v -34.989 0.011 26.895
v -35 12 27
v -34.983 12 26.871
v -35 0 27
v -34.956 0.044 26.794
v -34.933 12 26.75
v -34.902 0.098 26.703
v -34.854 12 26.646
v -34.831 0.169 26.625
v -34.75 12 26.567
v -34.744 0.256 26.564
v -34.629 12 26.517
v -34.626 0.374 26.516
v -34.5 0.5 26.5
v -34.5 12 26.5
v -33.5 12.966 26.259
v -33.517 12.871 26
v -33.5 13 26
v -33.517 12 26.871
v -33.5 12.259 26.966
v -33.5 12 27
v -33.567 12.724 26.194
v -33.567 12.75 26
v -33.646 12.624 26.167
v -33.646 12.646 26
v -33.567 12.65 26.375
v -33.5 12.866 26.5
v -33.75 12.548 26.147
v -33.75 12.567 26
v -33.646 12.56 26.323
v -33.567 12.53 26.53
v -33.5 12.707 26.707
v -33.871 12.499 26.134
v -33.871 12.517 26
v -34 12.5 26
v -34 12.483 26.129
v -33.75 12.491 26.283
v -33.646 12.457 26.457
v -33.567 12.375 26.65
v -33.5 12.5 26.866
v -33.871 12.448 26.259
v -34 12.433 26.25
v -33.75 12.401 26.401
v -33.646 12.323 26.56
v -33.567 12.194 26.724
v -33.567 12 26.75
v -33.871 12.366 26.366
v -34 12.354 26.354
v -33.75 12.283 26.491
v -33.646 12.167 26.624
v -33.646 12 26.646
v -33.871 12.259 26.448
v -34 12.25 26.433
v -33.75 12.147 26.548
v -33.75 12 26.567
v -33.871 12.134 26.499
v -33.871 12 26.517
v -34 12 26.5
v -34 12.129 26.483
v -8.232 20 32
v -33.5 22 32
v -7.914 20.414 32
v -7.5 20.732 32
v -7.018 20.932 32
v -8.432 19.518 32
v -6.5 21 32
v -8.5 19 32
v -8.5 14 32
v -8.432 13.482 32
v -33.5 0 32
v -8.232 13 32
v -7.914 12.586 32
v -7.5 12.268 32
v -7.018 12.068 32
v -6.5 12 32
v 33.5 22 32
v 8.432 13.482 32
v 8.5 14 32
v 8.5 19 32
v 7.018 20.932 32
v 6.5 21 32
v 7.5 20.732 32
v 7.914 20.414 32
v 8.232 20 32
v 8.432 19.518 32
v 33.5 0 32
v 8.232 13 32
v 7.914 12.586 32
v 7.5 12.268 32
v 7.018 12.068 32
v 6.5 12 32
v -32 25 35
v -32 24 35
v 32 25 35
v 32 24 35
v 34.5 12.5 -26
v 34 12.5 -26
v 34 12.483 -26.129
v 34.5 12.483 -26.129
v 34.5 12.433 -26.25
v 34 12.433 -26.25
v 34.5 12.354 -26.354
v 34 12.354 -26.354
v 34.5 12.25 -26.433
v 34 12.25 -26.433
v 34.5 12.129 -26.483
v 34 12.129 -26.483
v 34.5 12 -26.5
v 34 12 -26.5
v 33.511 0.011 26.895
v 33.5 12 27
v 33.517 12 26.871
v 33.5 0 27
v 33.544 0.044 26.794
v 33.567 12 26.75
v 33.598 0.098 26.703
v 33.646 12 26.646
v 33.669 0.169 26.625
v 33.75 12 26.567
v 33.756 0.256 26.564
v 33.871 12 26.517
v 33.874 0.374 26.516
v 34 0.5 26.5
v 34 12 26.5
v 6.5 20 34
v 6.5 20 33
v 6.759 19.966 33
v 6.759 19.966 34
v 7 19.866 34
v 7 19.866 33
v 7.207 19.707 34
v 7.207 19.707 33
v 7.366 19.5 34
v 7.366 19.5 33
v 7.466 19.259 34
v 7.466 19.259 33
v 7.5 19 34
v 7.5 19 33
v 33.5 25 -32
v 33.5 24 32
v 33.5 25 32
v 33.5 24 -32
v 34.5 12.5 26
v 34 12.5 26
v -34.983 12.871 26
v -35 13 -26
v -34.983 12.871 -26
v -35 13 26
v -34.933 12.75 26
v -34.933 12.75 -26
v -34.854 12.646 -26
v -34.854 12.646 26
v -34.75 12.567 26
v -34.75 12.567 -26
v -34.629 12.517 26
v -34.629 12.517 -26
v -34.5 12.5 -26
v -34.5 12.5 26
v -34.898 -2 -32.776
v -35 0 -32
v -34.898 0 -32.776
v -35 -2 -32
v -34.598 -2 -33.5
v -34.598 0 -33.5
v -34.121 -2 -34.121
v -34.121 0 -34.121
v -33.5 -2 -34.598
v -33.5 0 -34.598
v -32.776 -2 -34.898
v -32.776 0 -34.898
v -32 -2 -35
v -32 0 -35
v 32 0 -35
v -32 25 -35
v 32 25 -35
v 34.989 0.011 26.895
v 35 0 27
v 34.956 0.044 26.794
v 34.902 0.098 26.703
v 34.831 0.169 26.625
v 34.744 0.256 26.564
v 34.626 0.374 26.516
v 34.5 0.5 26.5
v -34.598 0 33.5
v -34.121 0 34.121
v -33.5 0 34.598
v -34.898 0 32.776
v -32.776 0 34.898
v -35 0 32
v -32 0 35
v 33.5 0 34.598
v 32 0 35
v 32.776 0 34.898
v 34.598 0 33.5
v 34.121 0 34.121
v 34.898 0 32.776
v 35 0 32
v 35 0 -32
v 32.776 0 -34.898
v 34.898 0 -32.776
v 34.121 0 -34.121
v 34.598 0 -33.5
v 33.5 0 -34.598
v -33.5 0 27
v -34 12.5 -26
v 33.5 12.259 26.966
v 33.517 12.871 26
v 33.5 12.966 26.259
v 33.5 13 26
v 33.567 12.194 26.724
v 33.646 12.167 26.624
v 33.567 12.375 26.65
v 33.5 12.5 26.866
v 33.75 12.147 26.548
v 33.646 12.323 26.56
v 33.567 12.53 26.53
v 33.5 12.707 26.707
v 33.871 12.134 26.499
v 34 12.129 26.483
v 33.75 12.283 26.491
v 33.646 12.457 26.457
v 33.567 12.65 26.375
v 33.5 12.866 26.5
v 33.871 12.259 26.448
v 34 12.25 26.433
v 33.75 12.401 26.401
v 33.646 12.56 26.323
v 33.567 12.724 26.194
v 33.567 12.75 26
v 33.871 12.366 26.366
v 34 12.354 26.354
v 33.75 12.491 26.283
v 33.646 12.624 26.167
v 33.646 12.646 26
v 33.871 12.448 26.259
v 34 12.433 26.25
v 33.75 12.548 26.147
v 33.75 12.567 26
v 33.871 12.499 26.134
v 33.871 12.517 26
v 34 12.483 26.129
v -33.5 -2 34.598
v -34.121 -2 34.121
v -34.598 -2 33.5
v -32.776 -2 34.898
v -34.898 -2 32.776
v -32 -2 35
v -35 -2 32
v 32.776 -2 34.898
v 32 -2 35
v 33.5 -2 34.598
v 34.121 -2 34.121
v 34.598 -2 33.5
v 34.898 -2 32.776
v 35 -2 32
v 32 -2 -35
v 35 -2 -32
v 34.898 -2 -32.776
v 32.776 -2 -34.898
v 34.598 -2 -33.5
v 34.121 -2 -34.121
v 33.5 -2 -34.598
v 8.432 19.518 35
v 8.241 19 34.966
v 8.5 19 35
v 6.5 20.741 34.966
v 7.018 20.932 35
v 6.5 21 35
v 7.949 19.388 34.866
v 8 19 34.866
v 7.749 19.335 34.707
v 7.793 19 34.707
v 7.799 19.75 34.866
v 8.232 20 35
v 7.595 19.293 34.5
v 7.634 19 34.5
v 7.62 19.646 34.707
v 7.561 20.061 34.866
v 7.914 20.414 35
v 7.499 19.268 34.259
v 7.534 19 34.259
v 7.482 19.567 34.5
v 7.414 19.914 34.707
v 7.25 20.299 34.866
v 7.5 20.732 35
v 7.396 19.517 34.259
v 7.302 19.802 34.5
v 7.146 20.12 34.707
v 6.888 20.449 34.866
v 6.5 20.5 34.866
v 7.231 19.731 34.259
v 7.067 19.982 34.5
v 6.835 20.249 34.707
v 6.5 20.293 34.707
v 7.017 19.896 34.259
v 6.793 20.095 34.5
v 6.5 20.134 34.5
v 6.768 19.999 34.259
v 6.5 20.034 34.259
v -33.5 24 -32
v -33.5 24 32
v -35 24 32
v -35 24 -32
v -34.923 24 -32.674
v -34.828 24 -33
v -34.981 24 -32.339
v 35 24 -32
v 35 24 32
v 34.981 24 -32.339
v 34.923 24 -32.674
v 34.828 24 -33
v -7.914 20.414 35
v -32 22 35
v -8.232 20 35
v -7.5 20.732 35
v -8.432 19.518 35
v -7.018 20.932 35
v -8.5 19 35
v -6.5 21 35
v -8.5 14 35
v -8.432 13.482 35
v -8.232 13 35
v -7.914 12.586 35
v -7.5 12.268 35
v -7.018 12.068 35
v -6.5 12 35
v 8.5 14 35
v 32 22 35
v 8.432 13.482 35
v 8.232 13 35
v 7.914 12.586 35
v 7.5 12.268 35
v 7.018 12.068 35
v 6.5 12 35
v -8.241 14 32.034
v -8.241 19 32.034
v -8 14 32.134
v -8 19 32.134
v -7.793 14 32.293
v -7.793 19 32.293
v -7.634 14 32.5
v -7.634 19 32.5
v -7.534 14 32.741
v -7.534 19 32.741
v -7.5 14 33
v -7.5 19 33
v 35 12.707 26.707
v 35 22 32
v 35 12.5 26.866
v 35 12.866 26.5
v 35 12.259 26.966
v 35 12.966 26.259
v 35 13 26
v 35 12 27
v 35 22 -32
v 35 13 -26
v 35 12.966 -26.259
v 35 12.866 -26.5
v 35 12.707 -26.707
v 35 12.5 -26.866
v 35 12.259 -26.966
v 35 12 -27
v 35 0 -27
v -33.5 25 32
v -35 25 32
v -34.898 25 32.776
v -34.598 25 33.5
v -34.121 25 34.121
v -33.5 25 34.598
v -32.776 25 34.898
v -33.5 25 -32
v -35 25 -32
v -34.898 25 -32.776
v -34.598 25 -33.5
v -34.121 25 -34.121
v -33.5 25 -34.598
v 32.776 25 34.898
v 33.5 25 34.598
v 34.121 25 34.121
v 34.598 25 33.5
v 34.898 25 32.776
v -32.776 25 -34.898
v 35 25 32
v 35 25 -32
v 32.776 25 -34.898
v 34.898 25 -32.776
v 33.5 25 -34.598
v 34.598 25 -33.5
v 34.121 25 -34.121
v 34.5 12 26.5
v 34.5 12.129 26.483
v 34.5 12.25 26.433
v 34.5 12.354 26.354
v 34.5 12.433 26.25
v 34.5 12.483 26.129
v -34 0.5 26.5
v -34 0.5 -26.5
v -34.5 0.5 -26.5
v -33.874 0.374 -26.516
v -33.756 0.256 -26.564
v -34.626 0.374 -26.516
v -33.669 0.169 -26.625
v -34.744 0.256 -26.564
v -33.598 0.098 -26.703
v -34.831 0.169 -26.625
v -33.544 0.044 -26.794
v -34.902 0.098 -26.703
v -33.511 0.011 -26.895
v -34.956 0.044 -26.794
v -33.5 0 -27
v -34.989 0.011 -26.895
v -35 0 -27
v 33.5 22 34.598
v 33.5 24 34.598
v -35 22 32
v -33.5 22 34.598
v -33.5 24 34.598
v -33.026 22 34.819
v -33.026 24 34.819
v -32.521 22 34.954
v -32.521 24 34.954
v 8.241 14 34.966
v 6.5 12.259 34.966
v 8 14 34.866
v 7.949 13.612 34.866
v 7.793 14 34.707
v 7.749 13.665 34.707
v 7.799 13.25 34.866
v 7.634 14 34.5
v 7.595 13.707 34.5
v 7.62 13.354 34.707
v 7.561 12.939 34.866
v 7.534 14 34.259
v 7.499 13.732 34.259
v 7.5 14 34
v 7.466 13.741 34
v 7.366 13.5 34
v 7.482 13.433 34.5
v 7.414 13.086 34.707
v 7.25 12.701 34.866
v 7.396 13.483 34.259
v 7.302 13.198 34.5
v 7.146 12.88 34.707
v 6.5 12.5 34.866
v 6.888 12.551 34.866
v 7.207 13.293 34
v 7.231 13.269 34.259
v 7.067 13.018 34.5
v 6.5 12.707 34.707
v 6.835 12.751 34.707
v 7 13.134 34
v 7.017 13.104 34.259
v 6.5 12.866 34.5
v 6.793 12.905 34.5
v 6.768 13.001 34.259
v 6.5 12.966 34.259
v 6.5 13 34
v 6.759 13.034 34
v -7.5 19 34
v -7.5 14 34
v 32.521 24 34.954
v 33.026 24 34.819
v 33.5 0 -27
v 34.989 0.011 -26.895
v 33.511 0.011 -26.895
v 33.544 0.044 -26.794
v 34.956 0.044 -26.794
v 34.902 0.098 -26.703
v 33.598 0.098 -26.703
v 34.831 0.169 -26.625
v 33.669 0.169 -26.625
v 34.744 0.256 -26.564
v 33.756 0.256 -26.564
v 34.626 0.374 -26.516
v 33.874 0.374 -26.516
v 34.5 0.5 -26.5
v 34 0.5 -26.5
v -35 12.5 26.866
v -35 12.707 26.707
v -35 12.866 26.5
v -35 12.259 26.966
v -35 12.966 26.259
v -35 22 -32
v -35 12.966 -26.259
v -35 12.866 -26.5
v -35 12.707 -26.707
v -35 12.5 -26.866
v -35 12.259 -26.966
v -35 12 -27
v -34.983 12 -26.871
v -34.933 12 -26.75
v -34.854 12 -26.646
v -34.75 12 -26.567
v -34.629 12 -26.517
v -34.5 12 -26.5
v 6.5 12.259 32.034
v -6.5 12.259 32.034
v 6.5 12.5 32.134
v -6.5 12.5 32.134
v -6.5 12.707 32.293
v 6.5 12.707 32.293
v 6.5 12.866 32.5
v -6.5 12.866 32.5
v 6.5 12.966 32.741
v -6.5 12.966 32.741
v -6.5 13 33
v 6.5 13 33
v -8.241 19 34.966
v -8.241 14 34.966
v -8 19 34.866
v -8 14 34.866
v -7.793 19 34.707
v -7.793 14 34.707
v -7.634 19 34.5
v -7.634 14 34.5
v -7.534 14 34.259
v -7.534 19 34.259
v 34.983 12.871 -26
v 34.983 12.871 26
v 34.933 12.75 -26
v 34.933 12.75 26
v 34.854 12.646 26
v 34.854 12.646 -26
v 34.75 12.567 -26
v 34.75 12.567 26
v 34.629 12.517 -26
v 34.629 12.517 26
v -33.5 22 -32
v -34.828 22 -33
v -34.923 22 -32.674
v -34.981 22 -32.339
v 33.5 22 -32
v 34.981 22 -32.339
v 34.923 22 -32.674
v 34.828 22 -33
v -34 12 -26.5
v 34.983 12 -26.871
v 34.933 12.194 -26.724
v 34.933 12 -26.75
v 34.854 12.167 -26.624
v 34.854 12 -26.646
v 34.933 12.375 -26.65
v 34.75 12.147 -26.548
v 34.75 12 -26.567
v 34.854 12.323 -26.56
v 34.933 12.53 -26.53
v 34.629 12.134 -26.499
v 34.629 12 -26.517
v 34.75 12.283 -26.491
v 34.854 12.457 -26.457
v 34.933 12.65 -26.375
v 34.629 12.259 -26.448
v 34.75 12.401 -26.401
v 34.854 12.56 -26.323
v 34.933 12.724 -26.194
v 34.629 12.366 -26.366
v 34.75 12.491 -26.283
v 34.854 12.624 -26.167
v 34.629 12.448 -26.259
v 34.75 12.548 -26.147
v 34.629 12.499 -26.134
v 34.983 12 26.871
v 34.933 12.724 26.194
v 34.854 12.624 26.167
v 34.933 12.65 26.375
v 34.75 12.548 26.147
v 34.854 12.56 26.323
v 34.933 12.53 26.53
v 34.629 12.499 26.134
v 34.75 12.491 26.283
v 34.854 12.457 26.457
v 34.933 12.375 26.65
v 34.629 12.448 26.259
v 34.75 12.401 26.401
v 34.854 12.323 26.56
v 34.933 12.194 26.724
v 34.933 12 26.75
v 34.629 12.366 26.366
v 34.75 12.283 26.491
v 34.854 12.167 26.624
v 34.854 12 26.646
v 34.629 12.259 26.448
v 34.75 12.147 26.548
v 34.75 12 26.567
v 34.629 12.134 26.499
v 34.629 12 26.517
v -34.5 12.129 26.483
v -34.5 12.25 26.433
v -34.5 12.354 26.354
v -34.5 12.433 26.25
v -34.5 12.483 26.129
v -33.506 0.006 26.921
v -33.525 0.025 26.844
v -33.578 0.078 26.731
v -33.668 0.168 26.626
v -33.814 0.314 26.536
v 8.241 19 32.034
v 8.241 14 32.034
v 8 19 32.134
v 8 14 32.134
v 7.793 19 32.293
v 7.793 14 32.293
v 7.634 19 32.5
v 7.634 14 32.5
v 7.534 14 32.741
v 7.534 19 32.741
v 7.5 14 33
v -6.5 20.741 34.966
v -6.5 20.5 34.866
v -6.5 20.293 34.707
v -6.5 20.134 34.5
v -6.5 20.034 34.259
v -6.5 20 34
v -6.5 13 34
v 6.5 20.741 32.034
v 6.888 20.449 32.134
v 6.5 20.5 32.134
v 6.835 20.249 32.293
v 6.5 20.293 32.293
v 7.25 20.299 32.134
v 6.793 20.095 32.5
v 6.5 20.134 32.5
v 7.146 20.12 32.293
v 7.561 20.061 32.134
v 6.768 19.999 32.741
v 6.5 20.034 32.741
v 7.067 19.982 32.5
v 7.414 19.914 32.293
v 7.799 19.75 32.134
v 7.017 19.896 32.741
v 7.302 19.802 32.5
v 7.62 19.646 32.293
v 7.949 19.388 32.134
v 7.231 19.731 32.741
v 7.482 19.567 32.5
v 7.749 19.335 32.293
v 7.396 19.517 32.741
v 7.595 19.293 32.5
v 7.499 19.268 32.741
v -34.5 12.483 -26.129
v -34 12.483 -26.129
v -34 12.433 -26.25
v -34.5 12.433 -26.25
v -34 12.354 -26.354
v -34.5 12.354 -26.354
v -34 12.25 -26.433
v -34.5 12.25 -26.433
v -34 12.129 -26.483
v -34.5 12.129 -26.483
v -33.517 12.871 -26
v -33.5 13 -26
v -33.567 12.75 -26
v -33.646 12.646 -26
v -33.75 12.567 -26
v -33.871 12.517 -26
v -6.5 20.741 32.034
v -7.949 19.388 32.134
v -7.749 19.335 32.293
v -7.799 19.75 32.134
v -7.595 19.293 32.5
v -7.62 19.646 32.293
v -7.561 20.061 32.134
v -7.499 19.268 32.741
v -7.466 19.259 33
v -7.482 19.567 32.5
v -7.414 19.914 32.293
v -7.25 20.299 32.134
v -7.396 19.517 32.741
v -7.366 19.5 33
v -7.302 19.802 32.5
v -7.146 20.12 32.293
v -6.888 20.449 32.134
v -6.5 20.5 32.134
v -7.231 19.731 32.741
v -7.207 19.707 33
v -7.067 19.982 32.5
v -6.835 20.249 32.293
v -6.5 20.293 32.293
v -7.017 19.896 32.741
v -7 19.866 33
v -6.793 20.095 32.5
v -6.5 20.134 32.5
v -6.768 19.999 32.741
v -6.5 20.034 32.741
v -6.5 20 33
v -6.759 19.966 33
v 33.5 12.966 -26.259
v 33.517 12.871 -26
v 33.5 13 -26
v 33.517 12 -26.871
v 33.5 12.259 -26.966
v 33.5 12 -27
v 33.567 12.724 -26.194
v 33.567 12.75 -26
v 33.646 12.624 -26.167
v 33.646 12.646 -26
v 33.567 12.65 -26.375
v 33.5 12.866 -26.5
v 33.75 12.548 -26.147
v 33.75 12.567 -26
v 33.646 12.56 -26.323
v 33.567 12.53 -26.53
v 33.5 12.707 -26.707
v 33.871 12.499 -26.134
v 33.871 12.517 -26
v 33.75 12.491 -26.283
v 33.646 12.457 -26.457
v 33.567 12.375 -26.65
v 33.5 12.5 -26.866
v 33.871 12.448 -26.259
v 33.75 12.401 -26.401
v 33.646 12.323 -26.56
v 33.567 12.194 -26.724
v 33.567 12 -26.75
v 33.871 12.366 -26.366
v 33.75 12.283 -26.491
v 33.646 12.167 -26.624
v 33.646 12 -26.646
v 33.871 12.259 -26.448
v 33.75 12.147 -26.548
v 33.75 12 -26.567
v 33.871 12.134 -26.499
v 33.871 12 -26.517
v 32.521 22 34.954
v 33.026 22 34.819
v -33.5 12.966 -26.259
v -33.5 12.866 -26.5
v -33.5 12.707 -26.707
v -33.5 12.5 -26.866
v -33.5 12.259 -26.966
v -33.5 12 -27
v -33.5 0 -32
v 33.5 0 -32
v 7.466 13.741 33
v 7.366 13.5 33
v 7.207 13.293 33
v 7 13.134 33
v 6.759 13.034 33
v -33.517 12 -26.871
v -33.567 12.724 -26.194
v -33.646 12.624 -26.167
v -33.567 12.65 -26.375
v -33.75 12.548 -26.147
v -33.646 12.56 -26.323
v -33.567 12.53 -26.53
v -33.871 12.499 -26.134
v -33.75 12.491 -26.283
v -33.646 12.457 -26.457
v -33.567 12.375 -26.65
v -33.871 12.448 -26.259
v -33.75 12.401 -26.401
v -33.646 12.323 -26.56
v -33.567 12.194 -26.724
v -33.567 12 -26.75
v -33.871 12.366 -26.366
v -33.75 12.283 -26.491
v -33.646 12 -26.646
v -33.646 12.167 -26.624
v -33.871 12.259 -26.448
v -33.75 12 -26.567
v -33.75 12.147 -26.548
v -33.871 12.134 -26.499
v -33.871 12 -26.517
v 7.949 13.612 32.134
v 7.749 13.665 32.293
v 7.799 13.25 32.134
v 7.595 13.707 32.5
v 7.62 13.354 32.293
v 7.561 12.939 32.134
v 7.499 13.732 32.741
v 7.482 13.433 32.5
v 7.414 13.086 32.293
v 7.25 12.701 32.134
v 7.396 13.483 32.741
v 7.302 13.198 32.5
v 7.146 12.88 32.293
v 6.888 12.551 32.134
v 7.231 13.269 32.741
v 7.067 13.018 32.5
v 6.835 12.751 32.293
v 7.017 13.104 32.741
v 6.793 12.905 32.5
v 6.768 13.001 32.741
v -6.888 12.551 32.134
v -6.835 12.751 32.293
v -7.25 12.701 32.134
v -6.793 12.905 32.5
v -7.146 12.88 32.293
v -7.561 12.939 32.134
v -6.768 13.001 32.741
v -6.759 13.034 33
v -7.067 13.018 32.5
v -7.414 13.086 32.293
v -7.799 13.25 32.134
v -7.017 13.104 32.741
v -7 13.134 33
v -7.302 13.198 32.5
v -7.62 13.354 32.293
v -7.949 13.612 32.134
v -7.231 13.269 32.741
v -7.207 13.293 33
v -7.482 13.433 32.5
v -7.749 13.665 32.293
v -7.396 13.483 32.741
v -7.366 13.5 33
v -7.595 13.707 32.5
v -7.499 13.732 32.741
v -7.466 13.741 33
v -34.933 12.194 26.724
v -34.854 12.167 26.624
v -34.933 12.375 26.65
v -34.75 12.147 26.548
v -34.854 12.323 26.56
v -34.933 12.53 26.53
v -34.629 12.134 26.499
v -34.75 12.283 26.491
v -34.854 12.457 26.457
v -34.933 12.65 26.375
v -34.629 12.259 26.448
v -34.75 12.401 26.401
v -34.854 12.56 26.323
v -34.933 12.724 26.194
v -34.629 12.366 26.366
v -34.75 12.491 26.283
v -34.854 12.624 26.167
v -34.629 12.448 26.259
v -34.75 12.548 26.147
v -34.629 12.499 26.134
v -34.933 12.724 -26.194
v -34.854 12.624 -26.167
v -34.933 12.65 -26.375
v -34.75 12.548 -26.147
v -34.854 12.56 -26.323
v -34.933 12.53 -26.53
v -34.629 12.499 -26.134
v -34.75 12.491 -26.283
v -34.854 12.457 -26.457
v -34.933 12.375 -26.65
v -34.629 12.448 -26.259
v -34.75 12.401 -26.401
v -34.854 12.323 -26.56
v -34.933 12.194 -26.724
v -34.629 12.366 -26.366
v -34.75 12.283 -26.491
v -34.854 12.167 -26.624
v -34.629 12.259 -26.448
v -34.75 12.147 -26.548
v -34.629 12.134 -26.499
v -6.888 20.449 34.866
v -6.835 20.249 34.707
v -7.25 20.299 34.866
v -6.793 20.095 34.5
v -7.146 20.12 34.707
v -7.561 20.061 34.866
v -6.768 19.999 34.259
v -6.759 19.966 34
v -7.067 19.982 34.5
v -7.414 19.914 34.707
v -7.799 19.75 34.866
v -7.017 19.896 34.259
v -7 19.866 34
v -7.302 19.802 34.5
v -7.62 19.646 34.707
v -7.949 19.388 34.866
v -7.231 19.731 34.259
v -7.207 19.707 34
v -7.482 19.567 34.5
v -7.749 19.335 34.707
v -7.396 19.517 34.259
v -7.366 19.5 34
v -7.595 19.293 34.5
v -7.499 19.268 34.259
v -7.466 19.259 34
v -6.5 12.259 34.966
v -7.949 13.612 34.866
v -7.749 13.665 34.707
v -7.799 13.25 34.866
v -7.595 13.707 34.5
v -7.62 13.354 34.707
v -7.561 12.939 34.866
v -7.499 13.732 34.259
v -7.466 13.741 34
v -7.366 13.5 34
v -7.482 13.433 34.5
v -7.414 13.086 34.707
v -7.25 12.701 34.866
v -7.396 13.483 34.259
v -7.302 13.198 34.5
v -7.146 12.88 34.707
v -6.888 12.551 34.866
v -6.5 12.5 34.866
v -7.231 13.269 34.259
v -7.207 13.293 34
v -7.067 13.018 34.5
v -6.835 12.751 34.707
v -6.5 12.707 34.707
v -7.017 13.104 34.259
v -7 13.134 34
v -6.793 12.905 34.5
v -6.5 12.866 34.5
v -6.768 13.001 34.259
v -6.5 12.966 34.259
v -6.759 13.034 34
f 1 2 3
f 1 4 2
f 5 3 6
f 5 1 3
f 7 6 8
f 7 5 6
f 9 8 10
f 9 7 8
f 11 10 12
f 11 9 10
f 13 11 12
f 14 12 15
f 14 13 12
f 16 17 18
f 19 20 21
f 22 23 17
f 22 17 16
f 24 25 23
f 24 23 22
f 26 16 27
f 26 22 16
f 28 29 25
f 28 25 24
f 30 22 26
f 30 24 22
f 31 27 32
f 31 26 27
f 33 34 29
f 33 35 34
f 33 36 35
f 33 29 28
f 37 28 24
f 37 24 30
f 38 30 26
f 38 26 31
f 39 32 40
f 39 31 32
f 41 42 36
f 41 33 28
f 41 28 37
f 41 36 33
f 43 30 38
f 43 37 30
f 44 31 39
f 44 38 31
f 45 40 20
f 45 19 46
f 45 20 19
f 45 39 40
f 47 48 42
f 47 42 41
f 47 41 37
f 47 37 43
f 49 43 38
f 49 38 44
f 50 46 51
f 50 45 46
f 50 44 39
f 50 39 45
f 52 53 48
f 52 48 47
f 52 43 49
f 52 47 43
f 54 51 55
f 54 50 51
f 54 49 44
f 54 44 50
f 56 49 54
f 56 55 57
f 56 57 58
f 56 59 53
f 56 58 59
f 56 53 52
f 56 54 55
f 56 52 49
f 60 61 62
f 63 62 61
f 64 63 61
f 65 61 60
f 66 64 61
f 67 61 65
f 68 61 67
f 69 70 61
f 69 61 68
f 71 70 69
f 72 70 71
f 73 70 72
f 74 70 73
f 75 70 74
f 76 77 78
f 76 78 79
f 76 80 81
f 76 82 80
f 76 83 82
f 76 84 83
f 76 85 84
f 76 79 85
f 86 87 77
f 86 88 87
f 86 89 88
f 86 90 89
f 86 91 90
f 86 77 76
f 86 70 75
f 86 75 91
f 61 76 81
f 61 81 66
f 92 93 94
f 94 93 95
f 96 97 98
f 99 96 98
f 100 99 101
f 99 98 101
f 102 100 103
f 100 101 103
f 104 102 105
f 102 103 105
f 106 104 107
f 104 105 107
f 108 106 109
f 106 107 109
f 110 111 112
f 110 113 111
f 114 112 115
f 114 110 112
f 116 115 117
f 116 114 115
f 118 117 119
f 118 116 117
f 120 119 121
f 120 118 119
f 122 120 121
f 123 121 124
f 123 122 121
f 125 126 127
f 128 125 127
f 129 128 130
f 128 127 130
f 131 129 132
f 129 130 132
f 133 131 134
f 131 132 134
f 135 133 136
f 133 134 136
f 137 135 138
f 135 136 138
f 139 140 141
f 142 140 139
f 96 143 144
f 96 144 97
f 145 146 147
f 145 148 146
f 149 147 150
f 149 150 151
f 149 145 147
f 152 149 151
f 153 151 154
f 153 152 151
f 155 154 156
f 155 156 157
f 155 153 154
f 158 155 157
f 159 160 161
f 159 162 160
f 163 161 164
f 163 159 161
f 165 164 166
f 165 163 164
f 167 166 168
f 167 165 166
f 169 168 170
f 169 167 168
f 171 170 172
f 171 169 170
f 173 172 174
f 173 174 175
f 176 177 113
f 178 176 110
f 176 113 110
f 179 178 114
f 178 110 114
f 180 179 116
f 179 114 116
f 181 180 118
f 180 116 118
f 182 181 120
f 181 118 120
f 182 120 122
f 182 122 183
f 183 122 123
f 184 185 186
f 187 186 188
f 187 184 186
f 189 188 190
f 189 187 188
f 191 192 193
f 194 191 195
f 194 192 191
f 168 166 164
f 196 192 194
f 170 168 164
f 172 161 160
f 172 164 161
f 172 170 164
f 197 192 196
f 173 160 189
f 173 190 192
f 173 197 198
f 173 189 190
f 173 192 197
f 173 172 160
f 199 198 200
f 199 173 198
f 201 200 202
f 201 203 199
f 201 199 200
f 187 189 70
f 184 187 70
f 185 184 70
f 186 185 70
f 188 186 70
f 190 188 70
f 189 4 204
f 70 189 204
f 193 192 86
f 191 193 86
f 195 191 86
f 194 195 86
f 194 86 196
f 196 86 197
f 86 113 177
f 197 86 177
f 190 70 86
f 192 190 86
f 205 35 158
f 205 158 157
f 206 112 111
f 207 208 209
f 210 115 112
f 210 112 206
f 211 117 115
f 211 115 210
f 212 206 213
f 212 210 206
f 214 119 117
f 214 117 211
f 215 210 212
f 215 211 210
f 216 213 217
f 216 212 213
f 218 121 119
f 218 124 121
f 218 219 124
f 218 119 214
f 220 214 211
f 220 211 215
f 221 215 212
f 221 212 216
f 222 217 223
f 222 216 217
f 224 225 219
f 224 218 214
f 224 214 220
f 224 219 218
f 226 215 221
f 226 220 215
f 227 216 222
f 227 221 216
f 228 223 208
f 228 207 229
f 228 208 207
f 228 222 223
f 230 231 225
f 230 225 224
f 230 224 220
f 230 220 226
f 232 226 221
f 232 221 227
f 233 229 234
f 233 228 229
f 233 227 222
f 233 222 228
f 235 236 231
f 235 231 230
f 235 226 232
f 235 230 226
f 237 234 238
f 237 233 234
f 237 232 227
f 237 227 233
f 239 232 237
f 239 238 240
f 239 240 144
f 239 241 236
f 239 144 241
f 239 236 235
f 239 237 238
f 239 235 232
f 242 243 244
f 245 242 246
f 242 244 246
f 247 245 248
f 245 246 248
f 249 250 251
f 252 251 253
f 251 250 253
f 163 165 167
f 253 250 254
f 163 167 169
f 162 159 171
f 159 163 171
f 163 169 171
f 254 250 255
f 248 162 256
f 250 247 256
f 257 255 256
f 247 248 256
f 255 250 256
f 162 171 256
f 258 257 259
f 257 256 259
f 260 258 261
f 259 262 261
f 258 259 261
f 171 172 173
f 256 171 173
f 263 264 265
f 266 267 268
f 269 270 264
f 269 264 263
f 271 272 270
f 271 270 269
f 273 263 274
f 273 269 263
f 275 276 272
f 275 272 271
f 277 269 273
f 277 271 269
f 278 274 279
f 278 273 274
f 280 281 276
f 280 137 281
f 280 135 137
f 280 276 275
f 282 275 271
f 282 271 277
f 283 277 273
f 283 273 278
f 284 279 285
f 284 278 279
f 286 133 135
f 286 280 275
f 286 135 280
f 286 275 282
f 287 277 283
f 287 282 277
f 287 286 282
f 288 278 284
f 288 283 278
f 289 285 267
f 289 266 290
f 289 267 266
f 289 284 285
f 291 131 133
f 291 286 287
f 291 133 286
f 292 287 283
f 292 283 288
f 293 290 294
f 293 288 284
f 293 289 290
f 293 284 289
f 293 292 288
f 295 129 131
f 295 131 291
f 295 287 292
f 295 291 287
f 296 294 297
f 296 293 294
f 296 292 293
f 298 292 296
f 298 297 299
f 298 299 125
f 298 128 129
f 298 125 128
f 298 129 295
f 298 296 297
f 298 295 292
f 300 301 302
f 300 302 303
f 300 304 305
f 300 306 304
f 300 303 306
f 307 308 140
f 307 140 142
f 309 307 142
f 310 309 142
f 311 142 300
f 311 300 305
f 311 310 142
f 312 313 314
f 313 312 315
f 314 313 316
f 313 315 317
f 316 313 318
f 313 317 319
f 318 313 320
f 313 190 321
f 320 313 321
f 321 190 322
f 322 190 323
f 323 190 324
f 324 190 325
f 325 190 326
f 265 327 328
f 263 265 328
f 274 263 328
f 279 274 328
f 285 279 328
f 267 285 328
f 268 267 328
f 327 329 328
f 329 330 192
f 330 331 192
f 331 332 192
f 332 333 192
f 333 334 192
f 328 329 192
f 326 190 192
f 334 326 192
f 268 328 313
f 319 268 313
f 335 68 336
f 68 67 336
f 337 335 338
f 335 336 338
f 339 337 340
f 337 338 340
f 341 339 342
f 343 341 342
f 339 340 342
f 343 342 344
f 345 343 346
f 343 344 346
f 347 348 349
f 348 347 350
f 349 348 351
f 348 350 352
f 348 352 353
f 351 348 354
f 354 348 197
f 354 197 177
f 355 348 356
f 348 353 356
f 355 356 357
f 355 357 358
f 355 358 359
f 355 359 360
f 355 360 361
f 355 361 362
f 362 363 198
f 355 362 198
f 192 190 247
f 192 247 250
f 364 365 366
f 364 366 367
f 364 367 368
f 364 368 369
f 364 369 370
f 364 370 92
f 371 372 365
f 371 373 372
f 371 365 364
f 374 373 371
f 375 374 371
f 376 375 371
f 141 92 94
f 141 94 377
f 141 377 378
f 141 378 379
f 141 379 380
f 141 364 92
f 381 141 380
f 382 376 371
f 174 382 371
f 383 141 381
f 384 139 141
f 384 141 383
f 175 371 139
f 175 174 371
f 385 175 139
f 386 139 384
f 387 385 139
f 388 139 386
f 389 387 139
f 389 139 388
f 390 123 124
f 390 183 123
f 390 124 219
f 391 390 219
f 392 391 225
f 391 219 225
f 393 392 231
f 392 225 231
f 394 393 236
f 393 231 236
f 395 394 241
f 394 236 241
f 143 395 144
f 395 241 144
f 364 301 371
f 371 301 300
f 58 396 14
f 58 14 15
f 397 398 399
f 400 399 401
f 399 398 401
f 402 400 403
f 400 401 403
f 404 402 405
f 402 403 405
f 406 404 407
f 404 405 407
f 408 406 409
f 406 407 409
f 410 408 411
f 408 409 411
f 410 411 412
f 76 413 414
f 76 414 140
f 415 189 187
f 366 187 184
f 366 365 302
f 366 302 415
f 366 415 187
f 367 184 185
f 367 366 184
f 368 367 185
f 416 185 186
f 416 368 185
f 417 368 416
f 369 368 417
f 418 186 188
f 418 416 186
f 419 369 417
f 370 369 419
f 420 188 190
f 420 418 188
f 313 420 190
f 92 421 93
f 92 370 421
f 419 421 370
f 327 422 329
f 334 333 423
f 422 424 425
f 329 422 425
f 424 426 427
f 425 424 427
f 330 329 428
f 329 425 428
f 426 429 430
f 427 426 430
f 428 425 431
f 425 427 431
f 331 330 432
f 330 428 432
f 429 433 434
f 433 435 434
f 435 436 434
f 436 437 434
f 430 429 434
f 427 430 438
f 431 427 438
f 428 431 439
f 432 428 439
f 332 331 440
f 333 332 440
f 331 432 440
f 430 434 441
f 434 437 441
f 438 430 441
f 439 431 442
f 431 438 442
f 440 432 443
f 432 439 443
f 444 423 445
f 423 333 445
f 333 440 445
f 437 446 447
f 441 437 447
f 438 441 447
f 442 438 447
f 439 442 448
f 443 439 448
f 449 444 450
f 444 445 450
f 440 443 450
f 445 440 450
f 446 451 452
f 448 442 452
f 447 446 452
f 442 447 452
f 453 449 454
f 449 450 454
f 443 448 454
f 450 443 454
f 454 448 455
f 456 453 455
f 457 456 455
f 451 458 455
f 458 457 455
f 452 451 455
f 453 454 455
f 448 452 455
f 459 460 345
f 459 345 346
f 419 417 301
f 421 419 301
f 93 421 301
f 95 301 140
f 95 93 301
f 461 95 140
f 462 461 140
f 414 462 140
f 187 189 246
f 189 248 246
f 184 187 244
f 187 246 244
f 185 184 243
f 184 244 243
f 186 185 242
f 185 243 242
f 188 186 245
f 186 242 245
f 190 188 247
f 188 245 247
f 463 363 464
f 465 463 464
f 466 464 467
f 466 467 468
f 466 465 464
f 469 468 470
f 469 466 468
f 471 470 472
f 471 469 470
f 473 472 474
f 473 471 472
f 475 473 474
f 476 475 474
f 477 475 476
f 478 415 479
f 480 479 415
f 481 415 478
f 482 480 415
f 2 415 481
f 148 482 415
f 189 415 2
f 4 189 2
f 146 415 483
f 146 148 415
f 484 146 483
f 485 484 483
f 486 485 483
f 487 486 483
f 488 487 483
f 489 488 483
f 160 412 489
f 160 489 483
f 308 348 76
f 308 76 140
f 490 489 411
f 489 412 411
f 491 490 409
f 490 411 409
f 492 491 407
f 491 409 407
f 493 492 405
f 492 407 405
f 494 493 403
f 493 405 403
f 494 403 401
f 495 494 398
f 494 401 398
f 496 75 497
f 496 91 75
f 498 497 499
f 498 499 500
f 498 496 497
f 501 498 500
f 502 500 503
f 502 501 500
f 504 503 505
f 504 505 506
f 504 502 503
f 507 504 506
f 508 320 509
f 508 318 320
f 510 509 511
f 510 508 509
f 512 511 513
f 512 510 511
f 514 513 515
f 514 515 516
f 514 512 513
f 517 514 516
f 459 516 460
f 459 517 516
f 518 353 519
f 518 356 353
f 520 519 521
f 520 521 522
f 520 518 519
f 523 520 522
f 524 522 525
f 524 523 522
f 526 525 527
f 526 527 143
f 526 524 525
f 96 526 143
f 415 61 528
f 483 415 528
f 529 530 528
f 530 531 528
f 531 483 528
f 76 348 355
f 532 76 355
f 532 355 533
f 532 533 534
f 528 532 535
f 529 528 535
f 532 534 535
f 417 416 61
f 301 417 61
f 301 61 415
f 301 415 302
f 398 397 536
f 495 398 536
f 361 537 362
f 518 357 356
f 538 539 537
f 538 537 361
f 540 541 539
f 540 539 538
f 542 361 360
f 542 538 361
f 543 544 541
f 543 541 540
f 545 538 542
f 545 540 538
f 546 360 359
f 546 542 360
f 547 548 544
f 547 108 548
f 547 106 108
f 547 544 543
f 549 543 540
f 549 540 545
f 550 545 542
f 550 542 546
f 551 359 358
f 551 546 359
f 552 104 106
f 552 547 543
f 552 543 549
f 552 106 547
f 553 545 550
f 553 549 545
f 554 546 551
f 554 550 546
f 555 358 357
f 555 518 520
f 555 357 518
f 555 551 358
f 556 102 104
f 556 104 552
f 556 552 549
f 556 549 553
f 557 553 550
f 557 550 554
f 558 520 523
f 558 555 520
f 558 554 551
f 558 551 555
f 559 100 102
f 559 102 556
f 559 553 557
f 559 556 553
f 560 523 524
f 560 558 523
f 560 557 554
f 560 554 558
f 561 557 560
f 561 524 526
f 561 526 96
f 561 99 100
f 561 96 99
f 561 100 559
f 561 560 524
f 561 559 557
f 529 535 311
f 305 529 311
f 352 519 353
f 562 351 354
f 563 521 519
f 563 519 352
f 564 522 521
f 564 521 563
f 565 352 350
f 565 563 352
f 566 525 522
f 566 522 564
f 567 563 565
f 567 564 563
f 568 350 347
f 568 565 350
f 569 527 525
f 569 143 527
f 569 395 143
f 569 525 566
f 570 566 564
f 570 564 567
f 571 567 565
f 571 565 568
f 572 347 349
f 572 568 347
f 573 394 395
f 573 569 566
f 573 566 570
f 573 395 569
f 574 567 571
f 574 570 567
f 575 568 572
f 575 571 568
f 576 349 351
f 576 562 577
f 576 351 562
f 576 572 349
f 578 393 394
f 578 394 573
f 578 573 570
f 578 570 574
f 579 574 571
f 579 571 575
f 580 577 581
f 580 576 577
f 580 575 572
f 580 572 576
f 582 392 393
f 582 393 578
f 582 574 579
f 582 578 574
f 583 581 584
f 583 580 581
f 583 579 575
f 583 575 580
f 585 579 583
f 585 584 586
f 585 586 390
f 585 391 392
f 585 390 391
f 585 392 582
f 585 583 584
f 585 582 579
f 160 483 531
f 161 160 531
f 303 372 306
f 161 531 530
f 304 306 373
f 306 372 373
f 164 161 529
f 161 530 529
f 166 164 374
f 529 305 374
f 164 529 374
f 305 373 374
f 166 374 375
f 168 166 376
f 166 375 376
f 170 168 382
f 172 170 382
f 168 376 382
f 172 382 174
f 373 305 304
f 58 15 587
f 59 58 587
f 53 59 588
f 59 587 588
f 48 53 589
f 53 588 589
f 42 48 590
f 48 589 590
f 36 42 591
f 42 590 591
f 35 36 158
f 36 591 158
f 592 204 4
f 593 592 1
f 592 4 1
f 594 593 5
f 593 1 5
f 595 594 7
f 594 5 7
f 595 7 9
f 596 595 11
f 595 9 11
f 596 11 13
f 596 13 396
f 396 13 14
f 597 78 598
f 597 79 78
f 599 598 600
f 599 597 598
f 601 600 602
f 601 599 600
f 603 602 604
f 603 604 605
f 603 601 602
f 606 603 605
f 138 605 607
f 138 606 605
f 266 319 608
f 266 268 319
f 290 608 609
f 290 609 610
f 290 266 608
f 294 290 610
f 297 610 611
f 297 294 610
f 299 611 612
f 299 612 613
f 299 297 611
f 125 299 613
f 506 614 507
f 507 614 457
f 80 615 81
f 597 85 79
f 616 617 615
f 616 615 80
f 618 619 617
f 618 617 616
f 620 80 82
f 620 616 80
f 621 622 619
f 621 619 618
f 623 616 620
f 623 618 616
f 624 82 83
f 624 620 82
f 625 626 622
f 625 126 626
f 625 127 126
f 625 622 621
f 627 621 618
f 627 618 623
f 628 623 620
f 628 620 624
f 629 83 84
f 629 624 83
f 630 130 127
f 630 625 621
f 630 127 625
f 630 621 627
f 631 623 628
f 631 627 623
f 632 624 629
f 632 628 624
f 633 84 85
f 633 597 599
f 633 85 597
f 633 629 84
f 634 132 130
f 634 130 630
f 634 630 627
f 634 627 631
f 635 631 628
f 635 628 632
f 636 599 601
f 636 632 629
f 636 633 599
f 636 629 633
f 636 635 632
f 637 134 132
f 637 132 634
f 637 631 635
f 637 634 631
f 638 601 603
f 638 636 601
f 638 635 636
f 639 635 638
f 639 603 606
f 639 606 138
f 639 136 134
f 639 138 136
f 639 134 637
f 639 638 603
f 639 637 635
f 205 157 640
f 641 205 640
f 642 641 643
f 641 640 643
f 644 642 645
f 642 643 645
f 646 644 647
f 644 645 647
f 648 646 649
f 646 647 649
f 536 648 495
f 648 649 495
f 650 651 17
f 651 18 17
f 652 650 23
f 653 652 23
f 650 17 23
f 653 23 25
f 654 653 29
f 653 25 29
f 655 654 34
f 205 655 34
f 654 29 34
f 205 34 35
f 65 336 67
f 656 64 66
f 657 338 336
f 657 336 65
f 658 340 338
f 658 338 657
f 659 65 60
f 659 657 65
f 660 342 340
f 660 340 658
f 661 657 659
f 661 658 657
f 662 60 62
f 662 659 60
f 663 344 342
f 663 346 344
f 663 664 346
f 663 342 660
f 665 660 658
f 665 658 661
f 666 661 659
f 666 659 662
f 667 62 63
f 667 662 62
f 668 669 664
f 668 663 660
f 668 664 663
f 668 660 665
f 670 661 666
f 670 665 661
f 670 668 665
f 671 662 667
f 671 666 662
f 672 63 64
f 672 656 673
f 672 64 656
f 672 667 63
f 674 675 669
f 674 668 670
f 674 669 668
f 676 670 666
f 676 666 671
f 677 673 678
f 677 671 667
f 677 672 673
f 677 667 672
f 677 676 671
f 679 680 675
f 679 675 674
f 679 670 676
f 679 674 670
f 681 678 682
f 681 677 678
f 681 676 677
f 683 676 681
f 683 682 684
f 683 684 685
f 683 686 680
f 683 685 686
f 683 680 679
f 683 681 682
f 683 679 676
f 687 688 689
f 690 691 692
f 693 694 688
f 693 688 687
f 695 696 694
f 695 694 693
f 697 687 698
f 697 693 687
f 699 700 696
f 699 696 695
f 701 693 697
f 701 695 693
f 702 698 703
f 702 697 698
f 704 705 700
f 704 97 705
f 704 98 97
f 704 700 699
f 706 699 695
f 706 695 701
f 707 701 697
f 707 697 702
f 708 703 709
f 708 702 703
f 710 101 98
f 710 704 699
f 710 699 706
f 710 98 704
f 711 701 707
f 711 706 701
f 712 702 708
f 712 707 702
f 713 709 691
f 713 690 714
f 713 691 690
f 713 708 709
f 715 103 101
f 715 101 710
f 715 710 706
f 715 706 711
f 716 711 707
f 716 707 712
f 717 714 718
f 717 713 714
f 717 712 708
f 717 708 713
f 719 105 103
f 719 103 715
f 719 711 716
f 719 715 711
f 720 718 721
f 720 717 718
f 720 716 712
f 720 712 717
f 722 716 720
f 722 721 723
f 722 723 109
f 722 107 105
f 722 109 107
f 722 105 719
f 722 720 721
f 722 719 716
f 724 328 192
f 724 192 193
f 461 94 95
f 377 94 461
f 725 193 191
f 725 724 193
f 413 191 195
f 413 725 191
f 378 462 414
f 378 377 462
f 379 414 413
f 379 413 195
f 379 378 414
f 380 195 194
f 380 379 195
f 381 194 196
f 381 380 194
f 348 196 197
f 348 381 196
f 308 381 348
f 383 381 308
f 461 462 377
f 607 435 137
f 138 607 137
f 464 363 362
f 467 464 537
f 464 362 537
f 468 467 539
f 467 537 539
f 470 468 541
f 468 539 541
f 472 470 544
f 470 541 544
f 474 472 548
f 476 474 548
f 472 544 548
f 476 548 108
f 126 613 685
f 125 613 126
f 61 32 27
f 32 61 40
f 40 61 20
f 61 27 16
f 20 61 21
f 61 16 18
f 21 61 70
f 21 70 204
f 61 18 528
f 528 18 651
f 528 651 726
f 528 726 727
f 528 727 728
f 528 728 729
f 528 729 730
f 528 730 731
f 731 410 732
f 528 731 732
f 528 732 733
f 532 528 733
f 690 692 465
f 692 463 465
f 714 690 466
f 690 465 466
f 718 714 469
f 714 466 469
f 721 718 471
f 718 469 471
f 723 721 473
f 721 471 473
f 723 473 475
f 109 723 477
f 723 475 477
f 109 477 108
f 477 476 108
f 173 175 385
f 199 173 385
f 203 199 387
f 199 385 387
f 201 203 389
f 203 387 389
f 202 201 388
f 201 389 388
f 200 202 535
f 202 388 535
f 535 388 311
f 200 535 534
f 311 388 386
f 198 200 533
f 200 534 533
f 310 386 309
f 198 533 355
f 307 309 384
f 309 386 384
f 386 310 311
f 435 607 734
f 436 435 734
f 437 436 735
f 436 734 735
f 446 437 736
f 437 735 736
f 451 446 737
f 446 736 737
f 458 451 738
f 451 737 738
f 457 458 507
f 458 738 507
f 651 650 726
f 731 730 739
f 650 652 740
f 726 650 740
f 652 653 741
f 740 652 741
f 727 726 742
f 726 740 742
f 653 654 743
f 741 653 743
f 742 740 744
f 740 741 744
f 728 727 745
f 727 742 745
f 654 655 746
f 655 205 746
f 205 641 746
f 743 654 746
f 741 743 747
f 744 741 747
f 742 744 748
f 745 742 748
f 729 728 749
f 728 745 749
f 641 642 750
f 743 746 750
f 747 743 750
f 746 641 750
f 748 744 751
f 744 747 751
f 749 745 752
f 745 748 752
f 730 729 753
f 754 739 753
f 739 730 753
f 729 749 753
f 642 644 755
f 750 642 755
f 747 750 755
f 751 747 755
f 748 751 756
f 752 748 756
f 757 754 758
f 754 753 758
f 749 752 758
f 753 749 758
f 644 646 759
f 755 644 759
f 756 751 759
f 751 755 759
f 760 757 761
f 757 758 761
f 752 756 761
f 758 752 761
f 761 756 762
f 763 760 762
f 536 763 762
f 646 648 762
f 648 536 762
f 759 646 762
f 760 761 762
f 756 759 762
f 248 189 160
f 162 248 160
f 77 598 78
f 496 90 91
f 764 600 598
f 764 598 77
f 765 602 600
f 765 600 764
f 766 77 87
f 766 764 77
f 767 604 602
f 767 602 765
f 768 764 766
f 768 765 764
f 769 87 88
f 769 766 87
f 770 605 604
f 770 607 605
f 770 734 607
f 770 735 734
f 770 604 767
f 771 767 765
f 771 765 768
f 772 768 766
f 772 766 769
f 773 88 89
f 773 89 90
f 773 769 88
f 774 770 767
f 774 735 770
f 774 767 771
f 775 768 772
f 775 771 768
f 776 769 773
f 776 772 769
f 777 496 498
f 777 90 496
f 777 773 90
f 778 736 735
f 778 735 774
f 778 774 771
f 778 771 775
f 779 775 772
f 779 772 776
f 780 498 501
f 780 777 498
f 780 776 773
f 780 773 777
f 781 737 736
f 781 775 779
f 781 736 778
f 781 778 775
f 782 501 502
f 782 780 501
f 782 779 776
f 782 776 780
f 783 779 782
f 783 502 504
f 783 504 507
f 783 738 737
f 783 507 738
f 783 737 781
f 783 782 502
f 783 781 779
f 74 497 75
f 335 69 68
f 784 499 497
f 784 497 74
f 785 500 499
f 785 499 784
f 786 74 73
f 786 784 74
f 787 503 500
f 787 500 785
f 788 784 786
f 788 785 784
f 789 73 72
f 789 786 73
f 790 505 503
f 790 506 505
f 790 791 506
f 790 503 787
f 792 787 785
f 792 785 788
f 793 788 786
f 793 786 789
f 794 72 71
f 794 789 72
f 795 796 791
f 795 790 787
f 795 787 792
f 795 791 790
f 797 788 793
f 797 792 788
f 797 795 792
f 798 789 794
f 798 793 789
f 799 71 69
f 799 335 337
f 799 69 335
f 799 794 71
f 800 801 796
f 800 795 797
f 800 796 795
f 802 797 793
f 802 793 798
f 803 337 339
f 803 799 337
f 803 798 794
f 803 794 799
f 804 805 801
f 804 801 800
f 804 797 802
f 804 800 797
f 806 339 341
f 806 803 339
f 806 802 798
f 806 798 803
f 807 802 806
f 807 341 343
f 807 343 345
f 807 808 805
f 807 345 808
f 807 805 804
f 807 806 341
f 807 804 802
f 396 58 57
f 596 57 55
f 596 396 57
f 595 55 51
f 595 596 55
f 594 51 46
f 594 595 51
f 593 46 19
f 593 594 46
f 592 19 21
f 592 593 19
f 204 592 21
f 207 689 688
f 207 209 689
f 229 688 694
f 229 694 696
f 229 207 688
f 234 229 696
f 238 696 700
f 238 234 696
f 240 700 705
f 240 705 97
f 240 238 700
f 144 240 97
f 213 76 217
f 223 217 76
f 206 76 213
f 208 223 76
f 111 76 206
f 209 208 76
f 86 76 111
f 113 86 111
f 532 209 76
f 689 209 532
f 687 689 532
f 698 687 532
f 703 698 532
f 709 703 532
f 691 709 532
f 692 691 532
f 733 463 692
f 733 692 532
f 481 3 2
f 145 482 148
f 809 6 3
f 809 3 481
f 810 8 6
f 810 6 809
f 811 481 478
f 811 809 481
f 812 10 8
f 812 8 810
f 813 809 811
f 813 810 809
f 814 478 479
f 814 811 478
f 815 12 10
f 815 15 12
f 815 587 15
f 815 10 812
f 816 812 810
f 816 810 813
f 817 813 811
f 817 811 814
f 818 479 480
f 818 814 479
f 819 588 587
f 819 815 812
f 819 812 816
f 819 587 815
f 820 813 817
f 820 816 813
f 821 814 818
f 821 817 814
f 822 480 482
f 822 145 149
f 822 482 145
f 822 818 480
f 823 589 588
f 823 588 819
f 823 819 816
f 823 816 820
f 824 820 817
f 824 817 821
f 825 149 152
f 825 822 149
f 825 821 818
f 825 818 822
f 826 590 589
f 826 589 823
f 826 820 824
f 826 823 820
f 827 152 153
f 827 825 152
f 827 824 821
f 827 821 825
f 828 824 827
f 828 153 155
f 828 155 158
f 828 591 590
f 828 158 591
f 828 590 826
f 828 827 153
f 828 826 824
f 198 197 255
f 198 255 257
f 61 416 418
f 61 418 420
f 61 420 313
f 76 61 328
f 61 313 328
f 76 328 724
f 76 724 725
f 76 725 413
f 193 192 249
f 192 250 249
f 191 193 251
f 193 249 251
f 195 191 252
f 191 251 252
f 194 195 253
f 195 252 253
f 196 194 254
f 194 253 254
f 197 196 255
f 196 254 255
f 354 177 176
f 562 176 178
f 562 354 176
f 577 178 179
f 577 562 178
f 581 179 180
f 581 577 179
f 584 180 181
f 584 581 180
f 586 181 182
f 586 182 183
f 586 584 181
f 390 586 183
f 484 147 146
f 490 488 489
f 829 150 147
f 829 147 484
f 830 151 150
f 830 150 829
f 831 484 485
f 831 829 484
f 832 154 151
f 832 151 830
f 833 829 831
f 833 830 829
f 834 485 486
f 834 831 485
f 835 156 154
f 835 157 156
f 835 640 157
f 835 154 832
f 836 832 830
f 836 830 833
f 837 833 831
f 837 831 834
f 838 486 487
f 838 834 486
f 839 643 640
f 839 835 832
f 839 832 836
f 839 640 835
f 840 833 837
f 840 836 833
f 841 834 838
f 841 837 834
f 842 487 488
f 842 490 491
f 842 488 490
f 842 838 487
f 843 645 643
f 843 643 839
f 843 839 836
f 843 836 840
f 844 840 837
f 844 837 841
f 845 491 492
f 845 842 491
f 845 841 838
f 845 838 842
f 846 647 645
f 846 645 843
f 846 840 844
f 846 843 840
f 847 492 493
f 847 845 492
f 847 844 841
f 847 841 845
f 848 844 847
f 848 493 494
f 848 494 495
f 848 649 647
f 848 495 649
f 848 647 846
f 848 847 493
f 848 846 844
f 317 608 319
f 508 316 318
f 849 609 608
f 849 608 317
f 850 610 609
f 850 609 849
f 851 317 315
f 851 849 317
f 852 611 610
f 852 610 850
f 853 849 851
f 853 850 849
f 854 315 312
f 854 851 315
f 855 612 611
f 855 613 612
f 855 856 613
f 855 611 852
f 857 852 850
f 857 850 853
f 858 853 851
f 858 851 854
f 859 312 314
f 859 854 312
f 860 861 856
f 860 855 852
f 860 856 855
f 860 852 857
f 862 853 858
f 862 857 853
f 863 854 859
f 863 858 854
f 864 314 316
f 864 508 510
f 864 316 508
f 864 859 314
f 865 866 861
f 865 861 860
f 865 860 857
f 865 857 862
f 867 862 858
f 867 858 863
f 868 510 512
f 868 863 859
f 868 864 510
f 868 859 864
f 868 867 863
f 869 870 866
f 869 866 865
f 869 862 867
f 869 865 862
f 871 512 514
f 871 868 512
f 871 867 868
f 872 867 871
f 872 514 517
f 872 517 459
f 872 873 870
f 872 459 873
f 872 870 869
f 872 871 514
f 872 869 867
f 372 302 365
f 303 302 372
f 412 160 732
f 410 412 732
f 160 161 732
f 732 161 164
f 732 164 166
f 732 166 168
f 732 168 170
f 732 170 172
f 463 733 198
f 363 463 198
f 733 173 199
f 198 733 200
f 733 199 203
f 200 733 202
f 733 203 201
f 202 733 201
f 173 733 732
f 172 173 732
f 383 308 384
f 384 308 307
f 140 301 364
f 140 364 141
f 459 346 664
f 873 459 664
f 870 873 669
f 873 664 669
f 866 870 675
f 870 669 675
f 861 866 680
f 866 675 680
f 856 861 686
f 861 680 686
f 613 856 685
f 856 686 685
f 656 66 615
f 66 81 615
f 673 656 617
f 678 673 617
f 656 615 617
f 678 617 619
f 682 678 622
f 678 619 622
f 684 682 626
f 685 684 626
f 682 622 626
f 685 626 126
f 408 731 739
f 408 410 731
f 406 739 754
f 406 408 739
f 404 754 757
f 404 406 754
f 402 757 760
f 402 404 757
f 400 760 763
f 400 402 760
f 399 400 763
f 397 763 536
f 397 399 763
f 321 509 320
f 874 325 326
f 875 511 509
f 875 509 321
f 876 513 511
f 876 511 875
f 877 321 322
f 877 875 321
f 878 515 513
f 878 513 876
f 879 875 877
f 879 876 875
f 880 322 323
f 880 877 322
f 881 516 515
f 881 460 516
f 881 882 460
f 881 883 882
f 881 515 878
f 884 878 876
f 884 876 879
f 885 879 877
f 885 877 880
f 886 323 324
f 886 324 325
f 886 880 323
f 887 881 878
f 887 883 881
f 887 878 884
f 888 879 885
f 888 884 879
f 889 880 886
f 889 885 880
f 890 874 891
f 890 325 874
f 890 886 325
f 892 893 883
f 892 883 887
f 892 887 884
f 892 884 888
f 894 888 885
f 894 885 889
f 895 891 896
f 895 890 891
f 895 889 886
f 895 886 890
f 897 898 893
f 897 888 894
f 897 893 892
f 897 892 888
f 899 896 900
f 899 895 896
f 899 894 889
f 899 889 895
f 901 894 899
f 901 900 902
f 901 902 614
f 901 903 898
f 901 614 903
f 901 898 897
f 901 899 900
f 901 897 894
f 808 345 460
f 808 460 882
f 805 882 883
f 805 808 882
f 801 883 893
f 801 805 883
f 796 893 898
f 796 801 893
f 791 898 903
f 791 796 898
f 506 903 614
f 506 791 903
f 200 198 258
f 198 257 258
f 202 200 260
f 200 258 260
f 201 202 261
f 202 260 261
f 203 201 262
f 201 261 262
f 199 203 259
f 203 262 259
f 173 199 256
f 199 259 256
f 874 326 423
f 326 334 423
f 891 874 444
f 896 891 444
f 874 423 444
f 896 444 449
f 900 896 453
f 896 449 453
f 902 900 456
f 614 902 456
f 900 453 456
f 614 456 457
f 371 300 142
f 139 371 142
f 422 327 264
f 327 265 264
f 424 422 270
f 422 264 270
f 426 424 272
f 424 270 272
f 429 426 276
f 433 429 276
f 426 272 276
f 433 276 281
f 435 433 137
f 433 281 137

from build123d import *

# Parameters (mm, degrees)
CROQUIS1_W              = 70
CROQUIS1_H              = 70
CROQUIS1_W_2            = 67
CROQUIS1_H_2            = 64
SALIENTE_EXTRUIR2_DEPTH = 25
CROQUIS3_W              = 70
CROQUIS3_H              = 70
SALIENTE_EXTRUIR3_DEPTH = 2
CROQUIS4_W              = 53
CROQUIS4_H              = 12.5
CORTAR_EXTRUIR1_DEPTH   = 71
CROQUIS5_W              = 15
CROQUIS5_H              = 7
CORTAR_EXTRUIR2_DEPTH   = 3
REDONDEO2_R             = 3
REDONDEO4_R             = 1
CROQUIS6_W              = 67
CROQUIS6_H              = 2
CORTAR_EXTRUIR3_DEPTH   = 68
REDONDEO6_R             = 0.5
REDONDEO7_R             = 3
CROQUIS7_W              = 65
CROQUIS7_H              = 2
CORTAR_EXTRUIR4_DEPTH   = 71


with BuildPart() as part:
    # Croquis1 → Saliente-Extruir2 (new body)
    with BuildSketch(Plane(origin=(0, 0, 0), x_dir=(1, 0, 0), z_dir=(0, 1, 0))):
        Rectangle(CROQUIS1_W, CROQUIS1_H)
        Rectangle(CROQUIS1_W_2, CROQUIS1_H_2, mode=Mode.SUBTRACT)
    extrude(amount=SALIENTE_EXTRUIR2_DEPTH)

    # Croquis4 → Cortar-Extruir1 (cut, through all)
    with BuildSketch(Plane(origin=(35, 0, 0), x_dir=(0, 0, -1), z_dir=(1, 0, 0))):
        with Locations((0, 6.25)):
            Rectangle(CROQUIS4_W, CROQUIS4_H)
    extrude(amount=-CORTAR_EXTRUIR1_DEPTH, mode=Mode.SUBTRACT)

    # Croquis5 → Cortar-Extruir2 (cut)
    with BuildSketch(Plane.XY.offset(35)):
        with Locations((0, 16.5)):
            Rectangle(CROQUIS5_W, CROQUIS5_H)
    extrude(amount=-CORTAR_EXTRUIR2_DEPTH, mode=Mode.SUBTRACT)

    # Redondeo2
    redondeo2_edges = [part.edges().sort_by_distance(p)[0] for p in [
        (35, 12.5, 35),
        (-35, 12.5, 35),
        (-35, 12.5, -35),
        (35, 12.5, -35),
    ]]
    fillet(redondeo2_edges, radius=REDONDEO2_R)

    # Redondeo4
    redondeo4_edges = [part.edges().sort_by_distance(p)[0] for p in [
        (7.5, 16.5, 35),
        (0, 20, 35),
        (-7.5, 16.5, 35),
        (0, 13, 35),
        (0, 20, 32),
        (-7.5, 20, 33.5),
        (-7.5, 16.5, 32),
        (-7.5, 13, 33.5),
        (0, 13, 32),
        (7.5, 13, 33.5),
        (7.5, 16.5, 32),
        (7.5, 20, 33.5),
    ]]
    fillet(redondeo4_edges, radius=REDONDEO4_R)

    # Croquis6 → Cortar-Extruir3 (cut)
    with BuildSketch(Plane.XY.offset(35)):
        with Locations((0, 23)):
            Rectangle(CROQUIS6_W, CROQUIS6_H)
    extrude(amount=-CORTAR_EXTRUIR3_DEPTH, mode=Mode.SUBTRACT)

    # Redondeo6
    redondeo6_edges = [part.edges().sort_by_distance(p)[0] for p in [
        (-33.5, 12.5, 0),
        (-33.5, 6.25, 26.5),
        (-33.5, 6.25, -26.5),
        (33.5, 6.25, -26.5),
        (34.25, 12.5, -26.5),
        (34.25, 0, -26.5),
        (33.5, 6.25, 26.5),
        (34.25, 0, 26.5),
        (33.5, 12.5, 0),
        (34.25, 12.5, 26.5),
        (-35, 6.25, -26.5),
        (-34.25, 12.5, -26.5),
        (-34.25, 0, -26.5),
        (-35, 6.25, 26.5),
        (-34.25, 0, 26.5),
        (-35, 12.5, 0),
        (-34.25, 12.5, 26.5),
        (35, 6.25, -26.5),
        (35, 12.5, 0),
        (35, 6.25, 26.5),
    ]]
    fillet(redondeo6_edges, radius=REDONDEO6_R)

    # Croquis7 → Cortar-Extruir4 (cut, through all)
    with BuildSketch(Plane(origin=(35, 0, 0), x_dir=(0, 0, -1), z_dir=(1, 0, 0))):
        with Locations((0.5, 23)):
            Rectangle(CROQUIS7_W, CROQUIS7_H)
    extrude(amount=-CORTAR_EXTRUIR4_DEPTH, mode=Mode.SUBTRACT)


with BuildPart() as body_2:
    # Croquis3 → Saliente-Extruir3 (new body)
    with BuildSketch(Plane(origin=(0, 0, 0), x_dir=(1, 0, 0), z_dir=(0, 1, 0))):
        Rectangle(CROQUIS3_W, CROQUIS3_H)
    extrude(amount=-SALIENTE_EXTRUIR3_DEPTH)

    # Redondeo7
    redondeo7_edges = [body_2.edges().sort_by_distance(p)[0] for p in [
        (35, -1, 35),
        (-35, -1, 35),
        (-35, -1, -35),
        (35, -1, -35),
    ]]
    fillet(redondeo7_edges, radius=REDONDEO7_R)


solid = Compound([part.part, body_2.part])
